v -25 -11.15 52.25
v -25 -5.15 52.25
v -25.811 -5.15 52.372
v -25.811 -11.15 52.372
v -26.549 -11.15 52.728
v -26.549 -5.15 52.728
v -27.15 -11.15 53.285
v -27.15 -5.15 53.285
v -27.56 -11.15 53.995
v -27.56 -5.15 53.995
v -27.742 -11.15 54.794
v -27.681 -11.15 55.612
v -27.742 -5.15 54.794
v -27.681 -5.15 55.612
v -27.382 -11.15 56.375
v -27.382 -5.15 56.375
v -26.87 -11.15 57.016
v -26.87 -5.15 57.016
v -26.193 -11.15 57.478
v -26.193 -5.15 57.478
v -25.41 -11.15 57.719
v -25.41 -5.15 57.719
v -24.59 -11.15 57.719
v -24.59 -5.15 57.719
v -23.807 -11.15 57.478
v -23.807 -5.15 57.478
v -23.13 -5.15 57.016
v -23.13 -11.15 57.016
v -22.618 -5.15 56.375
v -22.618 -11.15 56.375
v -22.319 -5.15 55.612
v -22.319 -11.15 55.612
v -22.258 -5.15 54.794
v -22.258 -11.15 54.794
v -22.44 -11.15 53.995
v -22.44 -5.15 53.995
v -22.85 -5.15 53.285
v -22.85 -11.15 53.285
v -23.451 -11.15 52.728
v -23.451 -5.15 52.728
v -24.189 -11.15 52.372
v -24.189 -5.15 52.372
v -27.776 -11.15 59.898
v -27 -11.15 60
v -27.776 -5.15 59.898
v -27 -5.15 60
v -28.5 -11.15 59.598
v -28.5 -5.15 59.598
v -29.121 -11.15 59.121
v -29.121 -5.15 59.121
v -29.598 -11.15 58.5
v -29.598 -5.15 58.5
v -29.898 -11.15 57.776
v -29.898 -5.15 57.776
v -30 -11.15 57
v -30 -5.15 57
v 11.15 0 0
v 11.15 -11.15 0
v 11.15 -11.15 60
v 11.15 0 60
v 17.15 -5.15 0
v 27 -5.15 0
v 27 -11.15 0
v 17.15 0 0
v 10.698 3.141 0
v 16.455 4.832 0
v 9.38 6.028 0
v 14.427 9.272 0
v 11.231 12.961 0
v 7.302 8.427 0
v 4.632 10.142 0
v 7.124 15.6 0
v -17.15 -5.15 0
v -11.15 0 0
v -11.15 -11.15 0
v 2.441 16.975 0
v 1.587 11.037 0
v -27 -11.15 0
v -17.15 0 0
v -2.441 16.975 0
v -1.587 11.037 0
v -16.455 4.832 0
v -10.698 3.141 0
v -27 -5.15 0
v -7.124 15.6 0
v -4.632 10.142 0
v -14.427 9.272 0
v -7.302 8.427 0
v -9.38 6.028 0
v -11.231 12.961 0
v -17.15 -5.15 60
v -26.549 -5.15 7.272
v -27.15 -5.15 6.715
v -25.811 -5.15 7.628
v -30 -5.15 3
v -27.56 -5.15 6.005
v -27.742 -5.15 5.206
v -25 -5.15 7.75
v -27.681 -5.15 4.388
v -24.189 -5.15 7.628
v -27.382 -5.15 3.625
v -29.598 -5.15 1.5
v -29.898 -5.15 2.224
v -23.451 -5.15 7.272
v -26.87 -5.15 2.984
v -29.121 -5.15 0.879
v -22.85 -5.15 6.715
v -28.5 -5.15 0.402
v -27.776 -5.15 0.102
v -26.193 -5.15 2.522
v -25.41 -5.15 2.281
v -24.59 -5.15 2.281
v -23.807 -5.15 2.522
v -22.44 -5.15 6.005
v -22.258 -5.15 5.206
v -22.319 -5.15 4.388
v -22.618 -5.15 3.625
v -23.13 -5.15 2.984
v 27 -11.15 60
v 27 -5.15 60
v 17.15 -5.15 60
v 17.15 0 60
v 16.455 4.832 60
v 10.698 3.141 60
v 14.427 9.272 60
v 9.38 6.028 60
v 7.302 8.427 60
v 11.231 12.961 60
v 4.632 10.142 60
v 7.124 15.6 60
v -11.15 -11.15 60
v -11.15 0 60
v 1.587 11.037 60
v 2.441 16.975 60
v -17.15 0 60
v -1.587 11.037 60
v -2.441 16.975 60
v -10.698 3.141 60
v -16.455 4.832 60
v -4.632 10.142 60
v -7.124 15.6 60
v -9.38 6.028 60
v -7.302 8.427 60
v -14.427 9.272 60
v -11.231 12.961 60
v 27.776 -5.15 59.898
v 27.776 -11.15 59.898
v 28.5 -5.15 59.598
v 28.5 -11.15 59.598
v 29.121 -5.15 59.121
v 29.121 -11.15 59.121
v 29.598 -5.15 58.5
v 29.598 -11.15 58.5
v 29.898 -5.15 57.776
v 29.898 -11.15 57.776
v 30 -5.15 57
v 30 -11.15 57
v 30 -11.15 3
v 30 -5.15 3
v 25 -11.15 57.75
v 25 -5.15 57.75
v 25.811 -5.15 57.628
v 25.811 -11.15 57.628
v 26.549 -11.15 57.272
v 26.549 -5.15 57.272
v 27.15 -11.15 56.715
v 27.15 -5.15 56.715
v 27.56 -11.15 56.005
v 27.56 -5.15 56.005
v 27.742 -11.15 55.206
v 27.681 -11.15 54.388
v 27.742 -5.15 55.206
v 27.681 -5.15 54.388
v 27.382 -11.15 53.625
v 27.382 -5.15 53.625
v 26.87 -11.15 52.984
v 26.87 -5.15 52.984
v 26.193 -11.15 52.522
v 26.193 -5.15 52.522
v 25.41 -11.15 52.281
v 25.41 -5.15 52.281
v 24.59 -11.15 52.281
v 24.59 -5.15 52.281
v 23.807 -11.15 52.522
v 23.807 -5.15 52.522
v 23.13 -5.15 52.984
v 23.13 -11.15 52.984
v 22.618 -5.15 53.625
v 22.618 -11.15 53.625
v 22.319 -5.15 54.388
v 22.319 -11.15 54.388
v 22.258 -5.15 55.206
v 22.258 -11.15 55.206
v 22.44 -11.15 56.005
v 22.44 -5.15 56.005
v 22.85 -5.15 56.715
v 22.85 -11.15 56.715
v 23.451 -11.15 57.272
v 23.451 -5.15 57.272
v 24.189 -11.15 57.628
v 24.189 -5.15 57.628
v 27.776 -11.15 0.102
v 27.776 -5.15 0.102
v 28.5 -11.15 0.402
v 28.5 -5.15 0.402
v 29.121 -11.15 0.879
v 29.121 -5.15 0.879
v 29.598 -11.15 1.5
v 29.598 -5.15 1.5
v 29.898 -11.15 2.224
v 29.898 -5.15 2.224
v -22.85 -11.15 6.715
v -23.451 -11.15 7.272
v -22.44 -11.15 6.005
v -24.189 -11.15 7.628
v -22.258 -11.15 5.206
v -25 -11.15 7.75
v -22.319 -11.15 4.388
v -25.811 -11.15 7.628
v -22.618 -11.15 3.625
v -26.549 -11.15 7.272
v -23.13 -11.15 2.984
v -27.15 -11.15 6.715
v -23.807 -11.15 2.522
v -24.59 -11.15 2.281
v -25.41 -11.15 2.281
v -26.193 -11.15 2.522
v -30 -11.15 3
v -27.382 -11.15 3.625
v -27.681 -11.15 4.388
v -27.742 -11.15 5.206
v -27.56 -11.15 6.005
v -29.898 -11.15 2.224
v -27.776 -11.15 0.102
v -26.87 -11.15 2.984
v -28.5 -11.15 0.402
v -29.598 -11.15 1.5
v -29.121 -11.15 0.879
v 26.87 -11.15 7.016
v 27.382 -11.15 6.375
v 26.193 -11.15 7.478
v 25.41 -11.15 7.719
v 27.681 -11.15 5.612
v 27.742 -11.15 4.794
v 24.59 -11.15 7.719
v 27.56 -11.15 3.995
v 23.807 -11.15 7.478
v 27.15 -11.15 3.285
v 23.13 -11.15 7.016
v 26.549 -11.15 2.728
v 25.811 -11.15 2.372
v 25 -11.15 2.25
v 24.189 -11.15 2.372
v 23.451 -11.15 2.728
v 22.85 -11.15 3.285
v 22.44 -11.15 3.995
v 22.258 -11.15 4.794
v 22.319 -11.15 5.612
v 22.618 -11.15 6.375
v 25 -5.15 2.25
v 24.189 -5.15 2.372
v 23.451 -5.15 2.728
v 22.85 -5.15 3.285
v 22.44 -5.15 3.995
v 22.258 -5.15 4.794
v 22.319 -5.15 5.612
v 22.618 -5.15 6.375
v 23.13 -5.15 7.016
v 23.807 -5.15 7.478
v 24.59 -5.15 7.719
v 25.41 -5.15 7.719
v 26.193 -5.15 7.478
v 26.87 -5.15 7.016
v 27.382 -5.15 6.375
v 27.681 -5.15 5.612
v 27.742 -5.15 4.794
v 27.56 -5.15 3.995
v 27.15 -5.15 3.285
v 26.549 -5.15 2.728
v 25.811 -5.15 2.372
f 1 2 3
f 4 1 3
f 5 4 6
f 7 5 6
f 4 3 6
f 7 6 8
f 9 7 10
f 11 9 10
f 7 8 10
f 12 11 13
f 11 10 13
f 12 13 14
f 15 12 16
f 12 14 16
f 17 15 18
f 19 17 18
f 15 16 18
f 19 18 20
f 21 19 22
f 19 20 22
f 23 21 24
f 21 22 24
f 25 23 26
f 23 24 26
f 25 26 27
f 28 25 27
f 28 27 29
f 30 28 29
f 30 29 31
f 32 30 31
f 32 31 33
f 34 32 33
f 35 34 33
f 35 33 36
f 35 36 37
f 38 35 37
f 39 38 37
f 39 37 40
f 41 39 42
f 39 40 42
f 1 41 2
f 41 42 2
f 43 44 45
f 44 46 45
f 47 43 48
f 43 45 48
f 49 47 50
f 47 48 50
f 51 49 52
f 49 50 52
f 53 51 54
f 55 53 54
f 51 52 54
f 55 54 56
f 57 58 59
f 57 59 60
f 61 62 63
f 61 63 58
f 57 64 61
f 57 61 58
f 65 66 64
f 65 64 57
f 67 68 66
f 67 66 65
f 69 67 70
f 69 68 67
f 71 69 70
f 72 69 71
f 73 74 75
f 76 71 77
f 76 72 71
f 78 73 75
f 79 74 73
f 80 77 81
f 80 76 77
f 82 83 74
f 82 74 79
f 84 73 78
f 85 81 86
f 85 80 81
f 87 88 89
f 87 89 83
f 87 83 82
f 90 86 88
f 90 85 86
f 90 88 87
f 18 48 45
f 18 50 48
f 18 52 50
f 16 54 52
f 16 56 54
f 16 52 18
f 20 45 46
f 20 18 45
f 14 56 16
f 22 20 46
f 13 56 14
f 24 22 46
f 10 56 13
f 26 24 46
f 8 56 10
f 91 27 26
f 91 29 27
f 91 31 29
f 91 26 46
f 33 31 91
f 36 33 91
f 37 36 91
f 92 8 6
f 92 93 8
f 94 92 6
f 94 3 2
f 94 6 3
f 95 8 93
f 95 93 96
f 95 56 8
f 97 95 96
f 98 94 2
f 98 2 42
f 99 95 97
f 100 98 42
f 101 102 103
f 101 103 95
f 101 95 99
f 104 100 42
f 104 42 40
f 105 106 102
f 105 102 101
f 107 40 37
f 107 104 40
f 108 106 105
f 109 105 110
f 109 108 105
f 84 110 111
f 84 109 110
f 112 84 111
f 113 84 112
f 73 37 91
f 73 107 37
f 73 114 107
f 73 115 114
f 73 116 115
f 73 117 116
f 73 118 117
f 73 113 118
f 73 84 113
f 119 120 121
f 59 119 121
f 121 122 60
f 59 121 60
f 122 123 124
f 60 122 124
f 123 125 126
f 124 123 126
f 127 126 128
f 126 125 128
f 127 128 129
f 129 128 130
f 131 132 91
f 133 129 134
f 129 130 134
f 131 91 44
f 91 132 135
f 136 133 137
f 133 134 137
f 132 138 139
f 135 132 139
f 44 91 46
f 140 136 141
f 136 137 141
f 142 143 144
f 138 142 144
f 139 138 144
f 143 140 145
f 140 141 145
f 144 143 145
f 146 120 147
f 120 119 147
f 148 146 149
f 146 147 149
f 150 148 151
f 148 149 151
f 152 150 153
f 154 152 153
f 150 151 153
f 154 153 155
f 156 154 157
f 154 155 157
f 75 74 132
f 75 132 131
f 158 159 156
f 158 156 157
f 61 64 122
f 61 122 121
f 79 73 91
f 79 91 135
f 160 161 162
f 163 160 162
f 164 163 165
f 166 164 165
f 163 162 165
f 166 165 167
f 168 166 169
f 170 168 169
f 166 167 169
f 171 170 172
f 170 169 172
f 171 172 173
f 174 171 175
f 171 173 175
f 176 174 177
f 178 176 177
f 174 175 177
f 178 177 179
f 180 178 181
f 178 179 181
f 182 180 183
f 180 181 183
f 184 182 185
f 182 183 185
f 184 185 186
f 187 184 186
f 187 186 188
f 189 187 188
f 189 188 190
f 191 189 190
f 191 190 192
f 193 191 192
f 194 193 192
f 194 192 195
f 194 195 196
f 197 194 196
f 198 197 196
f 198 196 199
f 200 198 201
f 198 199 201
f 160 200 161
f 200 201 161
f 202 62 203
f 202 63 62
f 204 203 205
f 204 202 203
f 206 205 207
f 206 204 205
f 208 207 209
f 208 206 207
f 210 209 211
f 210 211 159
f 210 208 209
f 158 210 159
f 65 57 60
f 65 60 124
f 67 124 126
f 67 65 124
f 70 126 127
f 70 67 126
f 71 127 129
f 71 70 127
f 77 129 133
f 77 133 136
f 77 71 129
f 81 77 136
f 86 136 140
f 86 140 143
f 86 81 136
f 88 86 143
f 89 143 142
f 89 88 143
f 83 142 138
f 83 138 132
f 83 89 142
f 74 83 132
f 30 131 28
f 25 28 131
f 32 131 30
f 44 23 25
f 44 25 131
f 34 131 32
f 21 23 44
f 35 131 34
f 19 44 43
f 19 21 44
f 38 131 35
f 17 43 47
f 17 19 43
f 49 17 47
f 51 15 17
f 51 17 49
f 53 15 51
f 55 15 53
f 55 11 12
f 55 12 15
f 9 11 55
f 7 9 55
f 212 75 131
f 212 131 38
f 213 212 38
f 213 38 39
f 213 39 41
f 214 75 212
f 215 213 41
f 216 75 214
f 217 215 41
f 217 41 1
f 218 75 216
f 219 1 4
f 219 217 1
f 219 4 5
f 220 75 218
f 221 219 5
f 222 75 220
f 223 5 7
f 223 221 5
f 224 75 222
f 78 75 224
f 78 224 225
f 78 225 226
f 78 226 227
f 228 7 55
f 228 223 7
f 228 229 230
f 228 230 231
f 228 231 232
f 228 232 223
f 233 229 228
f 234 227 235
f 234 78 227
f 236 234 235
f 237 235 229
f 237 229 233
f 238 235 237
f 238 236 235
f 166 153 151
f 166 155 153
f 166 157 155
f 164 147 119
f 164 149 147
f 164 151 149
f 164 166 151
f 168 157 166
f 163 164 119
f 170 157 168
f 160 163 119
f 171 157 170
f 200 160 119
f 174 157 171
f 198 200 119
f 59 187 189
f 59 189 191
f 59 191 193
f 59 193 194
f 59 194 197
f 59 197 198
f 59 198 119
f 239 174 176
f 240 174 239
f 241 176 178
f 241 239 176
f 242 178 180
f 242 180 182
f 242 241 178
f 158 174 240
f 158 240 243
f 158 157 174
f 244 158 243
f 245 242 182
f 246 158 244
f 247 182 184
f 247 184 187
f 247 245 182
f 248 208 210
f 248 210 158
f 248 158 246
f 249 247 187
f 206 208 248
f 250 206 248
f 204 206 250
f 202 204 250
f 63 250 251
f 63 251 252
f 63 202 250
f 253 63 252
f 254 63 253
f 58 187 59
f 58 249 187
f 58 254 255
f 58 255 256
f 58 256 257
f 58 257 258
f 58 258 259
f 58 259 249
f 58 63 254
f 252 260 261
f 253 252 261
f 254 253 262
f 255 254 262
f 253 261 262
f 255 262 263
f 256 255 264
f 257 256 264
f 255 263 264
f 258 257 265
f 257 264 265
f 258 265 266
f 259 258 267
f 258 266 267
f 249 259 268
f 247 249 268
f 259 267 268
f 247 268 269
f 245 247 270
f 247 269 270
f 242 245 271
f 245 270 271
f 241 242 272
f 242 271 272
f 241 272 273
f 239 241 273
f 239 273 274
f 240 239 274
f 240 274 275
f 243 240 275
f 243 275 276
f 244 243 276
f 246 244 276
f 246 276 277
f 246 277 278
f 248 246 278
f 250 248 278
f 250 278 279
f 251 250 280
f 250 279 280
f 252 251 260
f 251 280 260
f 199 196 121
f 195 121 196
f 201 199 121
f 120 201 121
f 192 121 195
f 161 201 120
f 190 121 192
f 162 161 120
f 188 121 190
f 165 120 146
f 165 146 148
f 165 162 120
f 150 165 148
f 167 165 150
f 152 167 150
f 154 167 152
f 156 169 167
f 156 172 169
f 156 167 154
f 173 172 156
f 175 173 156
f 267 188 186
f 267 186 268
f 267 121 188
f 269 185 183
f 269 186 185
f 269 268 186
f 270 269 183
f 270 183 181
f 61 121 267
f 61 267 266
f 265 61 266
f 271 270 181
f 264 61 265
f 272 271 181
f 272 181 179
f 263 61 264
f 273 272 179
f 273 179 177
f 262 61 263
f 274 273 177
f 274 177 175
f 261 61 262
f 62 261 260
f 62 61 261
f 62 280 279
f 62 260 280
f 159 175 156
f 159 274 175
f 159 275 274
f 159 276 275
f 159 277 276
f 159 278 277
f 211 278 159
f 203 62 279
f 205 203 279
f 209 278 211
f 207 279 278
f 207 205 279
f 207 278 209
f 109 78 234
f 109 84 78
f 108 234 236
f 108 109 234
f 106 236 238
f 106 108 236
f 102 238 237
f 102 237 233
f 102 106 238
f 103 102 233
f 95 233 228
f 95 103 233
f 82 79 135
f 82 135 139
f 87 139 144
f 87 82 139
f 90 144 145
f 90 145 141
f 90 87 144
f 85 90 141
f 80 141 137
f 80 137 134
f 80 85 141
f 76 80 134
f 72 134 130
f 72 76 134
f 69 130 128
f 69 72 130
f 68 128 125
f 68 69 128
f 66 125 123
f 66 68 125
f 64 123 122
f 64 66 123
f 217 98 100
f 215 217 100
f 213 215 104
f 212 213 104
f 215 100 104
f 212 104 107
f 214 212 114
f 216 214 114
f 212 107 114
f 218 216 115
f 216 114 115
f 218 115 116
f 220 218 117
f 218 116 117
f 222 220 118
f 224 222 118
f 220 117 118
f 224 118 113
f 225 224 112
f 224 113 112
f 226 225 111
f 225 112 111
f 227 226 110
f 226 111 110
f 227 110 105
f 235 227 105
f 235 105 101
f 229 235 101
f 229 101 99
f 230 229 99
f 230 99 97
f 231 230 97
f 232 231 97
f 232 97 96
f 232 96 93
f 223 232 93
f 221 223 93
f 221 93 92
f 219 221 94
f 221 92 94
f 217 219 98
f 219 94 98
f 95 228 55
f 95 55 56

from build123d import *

# Parameters (mm, degrees)
BOSS_EXTRUDE1_DEPTH = 60
SKETCH2_R           = 2.75
CUT_EXTRUDE1_DEPTH  = 6
FILLET1_R           = 3


with BuildPart() as part:
    # Sketch1 → Boss-Extrude1 (new body)
    with BuildSketch(Plane.XY):
        with BuildLine():
            Line((-11.15, 0), (-11.15, -11.15))
            Line((-11.15, -11.15), (-30, -11.15))
            Line((-30, -11.15), (-30, -5.15))
            Line((-30, -5.15), (-17.15, -5.15))
            Line((-17.15, -5.15), (-17.15, 0))
            ThreePointArc((-17.15, 0), (0, 17.15), (17.15, 0))
            Line((17.15, 0), (17.15, -5.15))
            Line((17.15, -5.15), (30, -5.15))
            Line((30, -5.15), (30, -11.15))
            Line((30, -11.15), (11.15, -11.15))
            Line((11.15, -11.15), (11.15, 0))
            ThreePointArc((11.15, 0), (0, 11.15), (-11.15, 0))
        make_face()
    extrude(amount=BOSS_EXTRUDE1_DEPTH)

    # Sketch2 → Cut-Extrude1 (cut)
    with BuildSketch(Plane(origin=(0, -5.15, 0), x_dir=(1, 0, 0), z_dir=(0, 1, 0))):
        with Locations(Location((-25, -5, 0), (0, 0, 270))):
            Circle(SKETCH2_R)
        with Locations(Location((-25, -55, 0), (0, 0, 90))):
            Circle(SKETCH2_R)
        with Locations(Location((25, -55, 0), (0, 0, 270))):
            Circle(SKETCH2_R)
        with Locations(Location((25, -5, 0), (0, 0, 90))):
            Circle(SKETCH2_R)
    extrude(amount=-CUT_EXTRUDE1_DEPTH, mode=Mode.SUBTRACT)

    # Fillet1
    fillet1_edges = [part.edges().sort_by_distance(p)[0] for p in [
        (-30, -8.15, 0),
        (30, -8.15, 0),
        (30, -8.15, 60),
        (-30, -8.15, 60),
    ]]
    fillet(fillet1_edges, radius=FILLET1_R)


solid = part.part
